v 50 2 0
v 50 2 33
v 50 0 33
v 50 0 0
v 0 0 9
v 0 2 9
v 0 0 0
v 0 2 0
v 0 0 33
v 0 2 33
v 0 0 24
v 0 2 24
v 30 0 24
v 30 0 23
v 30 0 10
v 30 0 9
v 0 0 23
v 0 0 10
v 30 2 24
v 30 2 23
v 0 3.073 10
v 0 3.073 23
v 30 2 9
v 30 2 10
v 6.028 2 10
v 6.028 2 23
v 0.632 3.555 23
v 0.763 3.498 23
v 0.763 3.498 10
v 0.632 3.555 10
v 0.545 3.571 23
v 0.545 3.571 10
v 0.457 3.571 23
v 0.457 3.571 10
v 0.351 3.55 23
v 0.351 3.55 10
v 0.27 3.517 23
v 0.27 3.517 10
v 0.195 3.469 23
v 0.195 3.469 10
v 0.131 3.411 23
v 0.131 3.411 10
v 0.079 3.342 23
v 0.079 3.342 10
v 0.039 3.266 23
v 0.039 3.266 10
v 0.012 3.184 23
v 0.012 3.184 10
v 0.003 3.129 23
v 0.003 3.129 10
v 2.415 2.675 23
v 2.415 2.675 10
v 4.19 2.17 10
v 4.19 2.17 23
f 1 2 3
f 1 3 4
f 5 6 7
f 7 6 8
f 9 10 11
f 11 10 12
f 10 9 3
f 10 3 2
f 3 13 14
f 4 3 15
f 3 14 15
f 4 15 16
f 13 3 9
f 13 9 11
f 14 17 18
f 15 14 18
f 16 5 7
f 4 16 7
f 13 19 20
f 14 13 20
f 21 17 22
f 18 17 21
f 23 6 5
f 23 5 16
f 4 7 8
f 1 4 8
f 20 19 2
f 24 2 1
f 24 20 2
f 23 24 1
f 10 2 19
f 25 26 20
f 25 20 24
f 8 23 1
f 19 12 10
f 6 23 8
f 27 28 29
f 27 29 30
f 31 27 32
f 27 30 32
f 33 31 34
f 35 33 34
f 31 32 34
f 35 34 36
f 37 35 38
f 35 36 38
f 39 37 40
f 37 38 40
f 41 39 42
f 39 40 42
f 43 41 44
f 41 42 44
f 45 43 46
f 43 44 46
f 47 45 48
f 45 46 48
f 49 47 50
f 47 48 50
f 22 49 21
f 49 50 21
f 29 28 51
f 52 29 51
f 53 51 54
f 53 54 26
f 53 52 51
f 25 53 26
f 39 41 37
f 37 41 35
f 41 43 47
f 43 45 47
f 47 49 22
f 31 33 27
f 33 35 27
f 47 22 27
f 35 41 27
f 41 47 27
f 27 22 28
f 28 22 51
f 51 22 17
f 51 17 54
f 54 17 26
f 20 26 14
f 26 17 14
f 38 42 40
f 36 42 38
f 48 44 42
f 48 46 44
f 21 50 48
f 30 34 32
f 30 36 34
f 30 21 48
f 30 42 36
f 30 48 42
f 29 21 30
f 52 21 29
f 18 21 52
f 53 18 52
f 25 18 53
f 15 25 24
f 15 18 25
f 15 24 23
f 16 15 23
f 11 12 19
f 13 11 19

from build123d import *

# Parameters (mm, degrees)
SKETCH2_W           = 33
SKETCH2_H           = 2
BOSS_EXTRUDE1_DEPTH = 50
SKETCH3_W           = 30
SKETCH3_H           = 1
CUT_EXTRUDE2_DEPTH  = 50
SKETCH4_W           = 3
SKETCH4_H           = 13
BOSS_EXTRUDE2_DEPTH = 2
CUT_EXTRUDE3_DEPTH  = 13
FILLET1_R           = 10
FILLET2_R           = 0.5


with BuildPart() as part:
    # Sketch2 → Boss-Extrude1 (new body)
    with BuildSketch(Plane(origin=(0, 0, 0), x_dir=(0, 0, -1), z_dir=(1, 0, 0))):
        with Locations((-16.5, 1)):
            Rectangle(SKETCH2_W, SKETCH2_H)
    extrude(amount=BOSS_EXTRUDE1_DEPTH)

    # Sketch3 → Cut-Extrude2 (cut)
    with BuildSketch(Plane(origin=(0, 2, 0), x_dir=(1, 0, 0), z_dir=(0, 1, 0))):
        with Locations((15, -9.5)):
            Rectangle(SKETCH3_W, SKETCH3_H)
        with Locations((15, -23.5)):
            Rectangle(SKETCH3_W, SKETCH3_H)
    extrude(amount=-CUT_EXTRUDE2_DEPTH, mode=Mode.SUBTRACT)

    # Sketch4 → Boss-Extrude2 (add)
    with BuildSketch(Plane(origin=(0, 2, 0), x_dir=(1, 0, 0), z_dir=(0, 1, 0))):
        with Locations((1.5, -16.5)):
            Rectangle(SKETCH4_W, SKETCH4_H)
    extrude(amount=BOSS_EXTRUDE2_DEPTH)

    # Sketch5 → Cut-Extrude3 (cut)
    with BuildSketch(Plane.XY.offset(23)):
        Polygon((3, 2), (0, 4), (3, 4), align=None)
    extrude(amount=-CUT_EXTRUDE3_DEPTH, mode=Mode.SUBTRACT)

    # Fillet1
    fillet1_edges = [part.edges().sort_by_distance(p)[0] for p in [
        (3, 2, 16.5),
    ]]
    fillet(fillet1_edges, radius=FILLET1_R)

    # Fillet2
    fillet2_edges = [part.edges().sort_by_distance(p)[0] for p in [
        (0, 4, 16.5),
    ]]
    fillet(fillet2_edges, radius=FILLET2_R)


solid = part.part
